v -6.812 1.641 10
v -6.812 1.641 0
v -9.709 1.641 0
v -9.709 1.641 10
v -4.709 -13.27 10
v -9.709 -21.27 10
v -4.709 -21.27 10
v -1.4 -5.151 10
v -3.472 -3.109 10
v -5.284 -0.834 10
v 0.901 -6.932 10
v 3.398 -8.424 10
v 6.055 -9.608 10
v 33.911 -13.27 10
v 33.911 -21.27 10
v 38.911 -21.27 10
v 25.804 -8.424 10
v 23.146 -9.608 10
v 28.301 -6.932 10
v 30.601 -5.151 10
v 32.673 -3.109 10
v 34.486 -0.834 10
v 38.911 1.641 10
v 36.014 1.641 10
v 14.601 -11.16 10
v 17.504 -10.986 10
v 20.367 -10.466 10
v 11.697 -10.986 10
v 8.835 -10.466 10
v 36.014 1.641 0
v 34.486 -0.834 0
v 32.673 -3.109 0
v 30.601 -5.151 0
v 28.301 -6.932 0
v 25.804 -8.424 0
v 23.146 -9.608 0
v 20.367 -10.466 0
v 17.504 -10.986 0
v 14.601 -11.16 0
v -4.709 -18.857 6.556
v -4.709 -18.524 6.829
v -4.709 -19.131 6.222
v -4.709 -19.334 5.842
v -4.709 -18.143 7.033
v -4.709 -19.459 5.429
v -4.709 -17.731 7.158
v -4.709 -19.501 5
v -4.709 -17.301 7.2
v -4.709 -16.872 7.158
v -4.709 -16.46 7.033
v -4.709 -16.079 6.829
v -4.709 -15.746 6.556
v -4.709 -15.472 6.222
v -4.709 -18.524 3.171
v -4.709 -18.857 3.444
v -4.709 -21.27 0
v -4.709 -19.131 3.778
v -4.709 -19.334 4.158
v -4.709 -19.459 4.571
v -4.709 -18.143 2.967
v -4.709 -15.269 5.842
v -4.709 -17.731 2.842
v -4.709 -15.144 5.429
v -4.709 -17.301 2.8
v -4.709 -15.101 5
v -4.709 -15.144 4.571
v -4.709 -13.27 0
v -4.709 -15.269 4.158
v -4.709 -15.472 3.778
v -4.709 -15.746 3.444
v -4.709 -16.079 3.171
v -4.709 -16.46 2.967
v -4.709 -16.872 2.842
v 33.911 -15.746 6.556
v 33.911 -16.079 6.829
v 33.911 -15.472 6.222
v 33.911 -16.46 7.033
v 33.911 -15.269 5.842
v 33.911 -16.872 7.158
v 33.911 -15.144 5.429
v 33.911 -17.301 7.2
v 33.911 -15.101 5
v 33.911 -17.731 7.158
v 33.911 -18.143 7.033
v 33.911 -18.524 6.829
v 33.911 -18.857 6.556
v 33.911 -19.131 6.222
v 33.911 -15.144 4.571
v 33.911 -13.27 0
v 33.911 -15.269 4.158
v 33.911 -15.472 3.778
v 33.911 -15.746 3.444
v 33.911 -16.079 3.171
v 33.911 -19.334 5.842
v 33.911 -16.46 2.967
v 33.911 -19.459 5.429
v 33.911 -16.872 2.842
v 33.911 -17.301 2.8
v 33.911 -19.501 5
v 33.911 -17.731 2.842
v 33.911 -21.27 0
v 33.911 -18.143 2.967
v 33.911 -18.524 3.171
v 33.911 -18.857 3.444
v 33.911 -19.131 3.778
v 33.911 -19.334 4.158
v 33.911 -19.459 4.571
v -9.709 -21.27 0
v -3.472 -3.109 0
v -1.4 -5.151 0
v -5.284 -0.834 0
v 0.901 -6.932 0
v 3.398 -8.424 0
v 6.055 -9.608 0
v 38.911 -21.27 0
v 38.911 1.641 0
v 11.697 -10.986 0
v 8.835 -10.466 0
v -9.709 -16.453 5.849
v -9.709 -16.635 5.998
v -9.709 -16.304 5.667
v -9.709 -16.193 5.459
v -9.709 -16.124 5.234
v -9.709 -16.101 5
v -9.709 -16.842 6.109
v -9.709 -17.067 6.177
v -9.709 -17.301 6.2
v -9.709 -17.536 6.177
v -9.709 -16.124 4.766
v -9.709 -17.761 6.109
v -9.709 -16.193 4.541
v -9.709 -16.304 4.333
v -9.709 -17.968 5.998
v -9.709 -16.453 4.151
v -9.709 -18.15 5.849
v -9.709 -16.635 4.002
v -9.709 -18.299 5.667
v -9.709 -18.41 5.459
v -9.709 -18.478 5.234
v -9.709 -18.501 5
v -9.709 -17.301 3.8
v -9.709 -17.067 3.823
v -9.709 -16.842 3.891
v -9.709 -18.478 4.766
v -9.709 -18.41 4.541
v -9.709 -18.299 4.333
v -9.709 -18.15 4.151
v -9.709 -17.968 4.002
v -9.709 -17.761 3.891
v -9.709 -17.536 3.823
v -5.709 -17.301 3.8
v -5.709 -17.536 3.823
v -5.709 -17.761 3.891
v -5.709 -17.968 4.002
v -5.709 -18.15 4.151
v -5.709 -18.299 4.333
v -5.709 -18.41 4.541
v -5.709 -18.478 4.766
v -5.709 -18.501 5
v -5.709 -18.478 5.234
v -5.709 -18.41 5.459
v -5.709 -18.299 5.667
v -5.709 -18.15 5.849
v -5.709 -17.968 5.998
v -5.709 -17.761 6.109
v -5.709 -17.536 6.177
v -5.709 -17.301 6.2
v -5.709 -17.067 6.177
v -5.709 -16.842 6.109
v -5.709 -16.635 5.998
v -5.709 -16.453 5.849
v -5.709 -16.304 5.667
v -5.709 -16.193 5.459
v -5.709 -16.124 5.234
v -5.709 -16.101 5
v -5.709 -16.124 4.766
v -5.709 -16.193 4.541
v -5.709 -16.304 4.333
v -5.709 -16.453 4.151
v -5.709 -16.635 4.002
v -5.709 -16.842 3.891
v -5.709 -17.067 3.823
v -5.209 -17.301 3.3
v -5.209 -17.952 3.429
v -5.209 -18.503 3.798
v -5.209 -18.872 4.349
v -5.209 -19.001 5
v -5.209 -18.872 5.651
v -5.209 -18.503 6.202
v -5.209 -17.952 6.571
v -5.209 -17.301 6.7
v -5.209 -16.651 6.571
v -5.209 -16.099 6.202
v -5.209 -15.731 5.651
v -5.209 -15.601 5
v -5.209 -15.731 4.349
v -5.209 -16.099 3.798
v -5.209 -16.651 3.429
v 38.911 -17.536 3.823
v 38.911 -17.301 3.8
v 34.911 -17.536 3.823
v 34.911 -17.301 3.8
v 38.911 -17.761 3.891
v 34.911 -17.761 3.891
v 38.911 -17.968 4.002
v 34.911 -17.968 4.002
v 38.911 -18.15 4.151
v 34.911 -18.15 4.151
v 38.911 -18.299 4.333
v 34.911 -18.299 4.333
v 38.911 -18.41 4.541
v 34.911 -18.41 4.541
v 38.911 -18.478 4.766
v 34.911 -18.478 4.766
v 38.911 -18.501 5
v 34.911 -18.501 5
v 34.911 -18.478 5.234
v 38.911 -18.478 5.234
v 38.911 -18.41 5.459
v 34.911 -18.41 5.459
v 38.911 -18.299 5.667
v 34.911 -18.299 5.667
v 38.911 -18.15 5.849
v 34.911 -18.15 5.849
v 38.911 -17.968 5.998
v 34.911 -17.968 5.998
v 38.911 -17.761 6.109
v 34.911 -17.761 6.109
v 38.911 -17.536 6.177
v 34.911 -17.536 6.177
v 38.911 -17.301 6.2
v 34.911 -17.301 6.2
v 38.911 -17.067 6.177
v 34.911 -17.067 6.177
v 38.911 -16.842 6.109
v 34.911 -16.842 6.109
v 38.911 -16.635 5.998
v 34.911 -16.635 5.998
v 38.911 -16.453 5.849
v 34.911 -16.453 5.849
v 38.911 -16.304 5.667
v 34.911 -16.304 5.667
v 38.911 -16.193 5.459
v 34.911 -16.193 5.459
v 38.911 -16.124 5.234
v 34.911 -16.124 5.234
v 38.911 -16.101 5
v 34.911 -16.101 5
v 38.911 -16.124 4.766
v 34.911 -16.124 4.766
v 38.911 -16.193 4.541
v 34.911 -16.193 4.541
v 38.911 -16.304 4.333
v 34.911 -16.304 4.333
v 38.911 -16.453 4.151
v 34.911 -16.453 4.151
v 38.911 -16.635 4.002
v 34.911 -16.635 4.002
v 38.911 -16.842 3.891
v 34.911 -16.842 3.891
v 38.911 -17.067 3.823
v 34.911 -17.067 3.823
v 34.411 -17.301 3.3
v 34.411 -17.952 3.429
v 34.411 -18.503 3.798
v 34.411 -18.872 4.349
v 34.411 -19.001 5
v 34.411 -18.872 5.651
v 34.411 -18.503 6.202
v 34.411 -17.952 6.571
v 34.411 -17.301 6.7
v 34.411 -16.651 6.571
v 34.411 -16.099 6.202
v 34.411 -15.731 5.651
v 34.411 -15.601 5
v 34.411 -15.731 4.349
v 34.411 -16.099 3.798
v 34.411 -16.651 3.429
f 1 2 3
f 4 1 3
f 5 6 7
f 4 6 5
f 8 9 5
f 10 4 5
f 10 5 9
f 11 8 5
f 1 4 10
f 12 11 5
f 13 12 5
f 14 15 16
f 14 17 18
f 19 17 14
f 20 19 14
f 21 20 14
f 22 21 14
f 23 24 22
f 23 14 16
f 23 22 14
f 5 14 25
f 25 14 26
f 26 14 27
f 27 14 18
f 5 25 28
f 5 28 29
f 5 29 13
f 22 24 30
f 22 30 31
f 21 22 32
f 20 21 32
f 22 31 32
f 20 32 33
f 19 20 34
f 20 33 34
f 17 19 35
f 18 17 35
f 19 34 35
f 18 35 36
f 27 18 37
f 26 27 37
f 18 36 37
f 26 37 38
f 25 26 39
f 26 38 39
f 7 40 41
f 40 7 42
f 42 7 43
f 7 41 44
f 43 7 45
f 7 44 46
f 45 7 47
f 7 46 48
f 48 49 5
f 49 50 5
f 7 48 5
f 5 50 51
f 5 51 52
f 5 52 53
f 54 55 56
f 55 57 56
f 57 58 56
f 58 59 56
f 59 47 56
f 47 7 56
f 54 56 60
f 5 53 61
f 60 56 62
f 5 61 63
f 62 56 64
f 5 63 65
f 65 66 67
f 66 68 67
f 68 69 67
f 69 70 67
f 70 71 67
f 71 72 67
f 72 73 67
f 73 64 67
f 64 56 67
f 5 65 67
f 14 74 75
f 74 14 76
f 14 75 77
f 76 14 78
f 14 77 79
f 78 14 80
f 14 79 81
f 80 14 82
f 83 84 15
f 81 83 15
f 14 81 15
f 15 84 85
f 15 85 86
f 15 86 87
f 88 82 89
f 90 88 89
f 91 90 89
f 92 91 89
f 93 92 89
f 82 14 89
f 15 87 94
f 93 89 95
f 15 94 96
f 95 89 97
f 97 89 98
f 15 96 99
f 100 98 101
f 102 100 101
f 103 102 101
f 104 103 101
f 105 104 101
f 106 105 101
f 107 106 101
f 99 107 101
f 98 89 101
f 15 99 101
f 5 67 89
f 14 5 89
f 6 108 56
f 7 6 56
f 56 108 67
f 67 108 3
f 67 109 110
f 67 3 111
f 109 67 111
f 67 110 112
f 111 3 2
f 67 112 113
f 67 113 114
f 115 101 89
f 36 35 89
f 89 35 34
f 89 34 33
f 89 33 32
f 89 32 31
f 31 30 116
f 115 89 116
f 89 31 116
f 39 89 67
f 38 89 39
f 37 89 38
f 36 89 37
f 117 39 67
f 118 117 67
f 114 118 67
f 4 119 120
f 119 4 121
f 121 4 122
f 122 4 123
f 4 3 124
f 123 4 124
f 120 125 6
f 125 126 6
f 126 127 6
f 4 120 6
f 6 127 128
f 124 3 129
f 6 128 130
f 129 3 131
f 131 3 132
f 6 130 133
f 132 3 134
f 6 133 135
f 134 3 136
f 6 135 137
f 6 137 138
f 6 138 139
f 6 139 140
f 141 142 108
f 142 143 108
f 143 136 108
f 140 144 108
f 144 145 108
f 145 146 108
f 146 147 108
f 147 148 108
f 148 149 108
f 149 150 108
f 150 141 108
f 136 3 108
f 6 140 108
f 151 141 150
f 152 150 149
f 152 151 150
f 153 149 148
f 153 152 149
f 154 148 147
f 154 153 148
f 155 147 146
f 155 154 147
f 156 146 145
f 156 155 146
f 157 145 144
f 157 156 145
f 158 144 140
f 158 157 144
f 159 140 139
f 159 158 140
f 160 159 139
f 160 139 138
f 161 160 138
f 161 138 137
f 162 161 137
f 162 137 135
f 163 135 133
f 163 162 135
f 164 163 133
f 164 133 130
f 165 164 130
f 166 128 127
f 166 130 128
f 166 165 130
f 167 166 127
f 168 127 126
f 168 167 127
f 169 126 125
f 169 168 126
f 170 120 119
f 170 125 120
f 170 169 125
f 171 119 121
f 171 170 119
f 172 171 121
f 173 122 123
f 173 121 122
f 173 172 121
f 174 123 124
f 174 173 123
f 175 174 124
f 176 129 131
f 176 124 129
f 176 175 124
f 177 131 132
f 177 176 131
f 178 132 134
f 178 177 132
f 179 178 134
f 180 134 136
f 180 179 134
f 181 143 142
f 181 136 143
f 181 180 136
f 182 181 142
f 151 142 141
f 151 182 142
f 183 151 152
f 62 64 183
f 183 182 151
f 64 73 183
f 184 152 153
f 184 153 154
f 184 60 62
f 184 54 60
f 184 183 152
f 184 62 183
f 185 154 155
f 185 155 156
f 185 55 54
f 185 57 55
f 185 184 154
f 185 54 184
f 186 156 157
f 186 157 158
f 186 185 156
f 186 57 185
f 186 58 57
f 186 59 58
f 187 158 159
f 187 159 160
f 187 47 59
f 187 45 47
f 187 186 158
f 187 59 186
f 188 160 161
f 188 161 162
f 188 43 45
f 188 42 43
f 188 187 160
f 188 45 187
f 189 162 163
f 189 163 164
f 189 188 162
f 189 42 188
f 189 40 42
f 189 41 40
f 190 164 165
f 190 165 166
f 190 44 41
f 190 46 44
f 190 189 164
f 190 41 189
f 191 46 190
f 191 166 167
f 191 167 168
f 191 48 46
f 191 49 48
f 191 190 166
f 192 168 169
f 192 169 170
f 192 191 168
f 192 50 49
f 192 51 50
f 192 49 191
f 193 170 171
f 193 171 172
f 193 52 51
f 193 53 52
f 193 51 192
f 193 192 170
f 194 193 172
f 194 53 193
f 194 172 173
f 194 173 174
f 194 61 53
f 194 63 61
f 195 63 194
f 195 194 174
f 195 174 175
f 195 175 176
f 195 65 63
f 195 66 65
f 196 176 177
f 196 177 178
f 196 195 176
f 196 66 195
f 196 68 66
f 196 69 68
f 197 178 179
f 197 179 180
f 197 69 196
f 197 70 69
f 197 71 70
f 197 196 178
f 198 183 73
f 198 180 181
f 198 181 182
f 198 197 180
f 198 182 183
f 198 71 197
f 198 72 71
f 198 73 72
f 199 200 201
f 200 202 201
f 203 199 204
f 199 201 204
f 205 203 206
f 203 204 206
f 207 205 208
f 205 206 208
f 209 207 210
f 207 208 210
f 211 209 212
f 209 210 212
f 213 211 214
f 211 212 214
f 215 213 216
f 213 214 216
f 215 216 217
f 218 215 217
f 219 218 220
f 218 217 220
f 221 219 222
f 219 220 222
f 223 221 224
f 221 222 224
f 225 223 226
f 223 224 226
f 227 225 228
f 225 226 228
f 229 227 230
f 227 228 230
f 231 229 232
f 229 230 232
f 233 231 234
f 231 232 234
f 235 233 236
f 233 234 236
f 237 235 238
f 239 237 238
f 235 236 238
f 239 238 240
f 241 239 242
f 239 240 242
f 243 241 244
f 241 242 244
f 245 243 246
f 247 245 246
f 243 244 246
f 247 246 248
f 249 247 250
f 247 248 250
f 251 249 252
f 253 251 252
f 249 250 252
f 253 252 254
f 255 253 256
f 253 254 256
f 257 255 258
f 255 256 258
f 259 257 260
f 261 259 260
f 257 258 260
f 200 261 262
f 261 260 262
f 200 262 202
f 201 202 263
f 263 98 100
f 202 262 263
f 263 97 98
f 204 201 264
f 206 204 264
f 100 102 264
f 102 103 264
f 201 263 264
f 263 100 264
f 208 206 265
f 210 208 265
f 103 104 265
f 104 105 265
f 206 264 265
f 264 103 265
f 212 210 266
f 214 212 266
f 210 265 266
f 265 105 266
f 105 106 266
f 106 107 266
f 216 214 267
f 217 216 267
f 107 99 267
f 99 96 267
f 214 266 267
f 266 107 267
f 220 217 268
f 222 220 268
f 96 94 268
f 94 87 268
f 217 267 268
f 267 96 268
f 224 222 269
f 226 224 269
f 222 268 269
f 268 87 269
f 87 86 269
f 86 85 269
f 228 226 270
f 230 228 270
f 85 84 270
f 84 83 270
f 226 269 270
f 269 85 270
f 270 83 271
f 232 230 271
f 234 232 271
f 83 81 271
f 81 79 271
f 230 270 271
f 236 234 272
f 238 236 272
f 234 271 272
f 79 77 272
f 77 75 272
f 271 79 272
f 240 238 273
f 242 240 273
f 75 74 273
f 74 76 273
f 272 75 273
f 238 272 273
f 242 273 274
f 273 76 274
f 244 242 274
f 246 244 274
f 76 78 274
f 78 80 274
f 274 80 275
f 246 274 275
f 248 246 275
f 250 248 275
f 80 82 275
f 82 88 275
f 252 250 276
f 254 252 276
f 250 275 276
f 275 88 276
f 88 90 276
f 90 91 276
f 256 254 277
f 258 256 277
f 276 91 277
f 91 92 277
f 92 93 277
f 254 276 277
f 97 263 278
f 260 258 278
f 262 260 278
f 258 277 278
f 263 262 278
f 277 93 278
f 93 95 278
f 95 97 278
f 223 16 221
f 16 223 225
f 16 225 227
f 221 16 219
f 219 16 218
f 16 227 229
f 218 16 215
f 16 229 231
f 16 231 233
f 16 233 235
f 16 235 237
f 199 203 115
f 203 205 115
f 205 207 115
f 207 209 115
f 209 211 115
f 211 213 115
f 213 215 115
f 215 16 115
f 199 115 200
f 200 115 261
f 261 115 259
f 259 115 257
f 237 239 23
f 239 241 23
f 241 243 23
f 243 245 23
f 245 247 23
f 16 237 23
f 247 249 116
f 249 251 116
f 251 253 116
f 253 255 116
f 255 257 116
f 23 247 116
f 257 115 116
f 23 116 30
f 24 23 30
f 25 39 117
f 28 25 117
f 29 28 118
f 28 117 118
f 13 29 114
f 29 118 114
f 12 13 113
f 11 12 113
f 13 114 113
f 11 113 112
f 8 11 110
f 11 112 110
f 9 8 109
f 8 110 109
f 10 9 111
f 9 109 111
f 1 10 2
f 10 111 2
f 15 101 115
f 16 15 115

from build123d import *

# Parameters (mm, degrees)
BOSS_EXTRUDE1_DEPTH = 10


with BuildPart() as part:
    # Sketch1 → Boss-Extrude1 (new body)
    with BuildSketch(Plane.XY):
        with BuildLine():
            Line((-9.709376273, 1.641432906), (-9.709376273, -21.269563621))
            Line((-9.709376273, -21.269563621), (-4.709376273, -21.269563621))
            Line((-4.709376273, -21.269563621), (-4.709376273, -13.269563621))
            Line((-4.709376273, -13.269563621), (14.600623727, -13.269563621))
            Line((14.600623727, -13.269563621), (14.600623727, -11.159563621))
            ThreePointArc((14.600623727, -11.159563621), (2.126806638, -7.715324743), (-6.812431614, 1.641432906))
            Line((-6.812431614, 1.641432906), (-9.709376273, 1.641432906))
        make_face()
        with BuildLine():
            Line((14.600623727, -11.159563621), (14.600623727, -13.269563621))
            Line((14.600623727, -13.269563621), (33.910623727, -13.269563621))
            Line((33.910623727, -13.269563621), (33.910623727, -21.269563621))
            Line((33.910623727, -21.269563621), (38.910623727, -21.269563621))
            Line((38.910623727, -21.269563621), (38.910623727, 1.641432906))
            Line((38.910623727, 1.641432906), (36.013679069, 1.641432906))
            ThreePointArc((36.013679069, 1.641432906), (27.074440817, -7.715324743), (14.600623727, -11.159563621))
        make_face()
    extrude(amount=BOSS_EXTRUDE1_DEPTH)

    # Sketch4 → CSK for M2 Countersunk Flat Head Screw1 (revolve, cut)
    with BuildSketch(Plane(origin=(-4.709376273, -17.301406974, 5), x_dir=(0, 0, -1), z_dir=(0, 1, 0))):
        Polygon((0, 0), (0, 17.221032743), (1.2, 16.5), (1.2, 1), (2.2, 0), align=None)
    csk_for_m2_countersunk_flat_head_screw1 = revolve(axis=Axis((1.640623727, -17.301406974, 5), (-1, 0, 0)), mode=Mode.SUBTRACT)

    # Mirror2: CSK for M2 Countersunk Flat Head Screw1 across plane
    add(csk_for_m2_countersunk_flat_head_screw1.mirror(Plane(origin=(14.600623727, 0, 0), x_dir=(0, 0, 1), z_dir=(1, 0, 0))), mode=Mode.SUBTRACT)


solid = part.part
